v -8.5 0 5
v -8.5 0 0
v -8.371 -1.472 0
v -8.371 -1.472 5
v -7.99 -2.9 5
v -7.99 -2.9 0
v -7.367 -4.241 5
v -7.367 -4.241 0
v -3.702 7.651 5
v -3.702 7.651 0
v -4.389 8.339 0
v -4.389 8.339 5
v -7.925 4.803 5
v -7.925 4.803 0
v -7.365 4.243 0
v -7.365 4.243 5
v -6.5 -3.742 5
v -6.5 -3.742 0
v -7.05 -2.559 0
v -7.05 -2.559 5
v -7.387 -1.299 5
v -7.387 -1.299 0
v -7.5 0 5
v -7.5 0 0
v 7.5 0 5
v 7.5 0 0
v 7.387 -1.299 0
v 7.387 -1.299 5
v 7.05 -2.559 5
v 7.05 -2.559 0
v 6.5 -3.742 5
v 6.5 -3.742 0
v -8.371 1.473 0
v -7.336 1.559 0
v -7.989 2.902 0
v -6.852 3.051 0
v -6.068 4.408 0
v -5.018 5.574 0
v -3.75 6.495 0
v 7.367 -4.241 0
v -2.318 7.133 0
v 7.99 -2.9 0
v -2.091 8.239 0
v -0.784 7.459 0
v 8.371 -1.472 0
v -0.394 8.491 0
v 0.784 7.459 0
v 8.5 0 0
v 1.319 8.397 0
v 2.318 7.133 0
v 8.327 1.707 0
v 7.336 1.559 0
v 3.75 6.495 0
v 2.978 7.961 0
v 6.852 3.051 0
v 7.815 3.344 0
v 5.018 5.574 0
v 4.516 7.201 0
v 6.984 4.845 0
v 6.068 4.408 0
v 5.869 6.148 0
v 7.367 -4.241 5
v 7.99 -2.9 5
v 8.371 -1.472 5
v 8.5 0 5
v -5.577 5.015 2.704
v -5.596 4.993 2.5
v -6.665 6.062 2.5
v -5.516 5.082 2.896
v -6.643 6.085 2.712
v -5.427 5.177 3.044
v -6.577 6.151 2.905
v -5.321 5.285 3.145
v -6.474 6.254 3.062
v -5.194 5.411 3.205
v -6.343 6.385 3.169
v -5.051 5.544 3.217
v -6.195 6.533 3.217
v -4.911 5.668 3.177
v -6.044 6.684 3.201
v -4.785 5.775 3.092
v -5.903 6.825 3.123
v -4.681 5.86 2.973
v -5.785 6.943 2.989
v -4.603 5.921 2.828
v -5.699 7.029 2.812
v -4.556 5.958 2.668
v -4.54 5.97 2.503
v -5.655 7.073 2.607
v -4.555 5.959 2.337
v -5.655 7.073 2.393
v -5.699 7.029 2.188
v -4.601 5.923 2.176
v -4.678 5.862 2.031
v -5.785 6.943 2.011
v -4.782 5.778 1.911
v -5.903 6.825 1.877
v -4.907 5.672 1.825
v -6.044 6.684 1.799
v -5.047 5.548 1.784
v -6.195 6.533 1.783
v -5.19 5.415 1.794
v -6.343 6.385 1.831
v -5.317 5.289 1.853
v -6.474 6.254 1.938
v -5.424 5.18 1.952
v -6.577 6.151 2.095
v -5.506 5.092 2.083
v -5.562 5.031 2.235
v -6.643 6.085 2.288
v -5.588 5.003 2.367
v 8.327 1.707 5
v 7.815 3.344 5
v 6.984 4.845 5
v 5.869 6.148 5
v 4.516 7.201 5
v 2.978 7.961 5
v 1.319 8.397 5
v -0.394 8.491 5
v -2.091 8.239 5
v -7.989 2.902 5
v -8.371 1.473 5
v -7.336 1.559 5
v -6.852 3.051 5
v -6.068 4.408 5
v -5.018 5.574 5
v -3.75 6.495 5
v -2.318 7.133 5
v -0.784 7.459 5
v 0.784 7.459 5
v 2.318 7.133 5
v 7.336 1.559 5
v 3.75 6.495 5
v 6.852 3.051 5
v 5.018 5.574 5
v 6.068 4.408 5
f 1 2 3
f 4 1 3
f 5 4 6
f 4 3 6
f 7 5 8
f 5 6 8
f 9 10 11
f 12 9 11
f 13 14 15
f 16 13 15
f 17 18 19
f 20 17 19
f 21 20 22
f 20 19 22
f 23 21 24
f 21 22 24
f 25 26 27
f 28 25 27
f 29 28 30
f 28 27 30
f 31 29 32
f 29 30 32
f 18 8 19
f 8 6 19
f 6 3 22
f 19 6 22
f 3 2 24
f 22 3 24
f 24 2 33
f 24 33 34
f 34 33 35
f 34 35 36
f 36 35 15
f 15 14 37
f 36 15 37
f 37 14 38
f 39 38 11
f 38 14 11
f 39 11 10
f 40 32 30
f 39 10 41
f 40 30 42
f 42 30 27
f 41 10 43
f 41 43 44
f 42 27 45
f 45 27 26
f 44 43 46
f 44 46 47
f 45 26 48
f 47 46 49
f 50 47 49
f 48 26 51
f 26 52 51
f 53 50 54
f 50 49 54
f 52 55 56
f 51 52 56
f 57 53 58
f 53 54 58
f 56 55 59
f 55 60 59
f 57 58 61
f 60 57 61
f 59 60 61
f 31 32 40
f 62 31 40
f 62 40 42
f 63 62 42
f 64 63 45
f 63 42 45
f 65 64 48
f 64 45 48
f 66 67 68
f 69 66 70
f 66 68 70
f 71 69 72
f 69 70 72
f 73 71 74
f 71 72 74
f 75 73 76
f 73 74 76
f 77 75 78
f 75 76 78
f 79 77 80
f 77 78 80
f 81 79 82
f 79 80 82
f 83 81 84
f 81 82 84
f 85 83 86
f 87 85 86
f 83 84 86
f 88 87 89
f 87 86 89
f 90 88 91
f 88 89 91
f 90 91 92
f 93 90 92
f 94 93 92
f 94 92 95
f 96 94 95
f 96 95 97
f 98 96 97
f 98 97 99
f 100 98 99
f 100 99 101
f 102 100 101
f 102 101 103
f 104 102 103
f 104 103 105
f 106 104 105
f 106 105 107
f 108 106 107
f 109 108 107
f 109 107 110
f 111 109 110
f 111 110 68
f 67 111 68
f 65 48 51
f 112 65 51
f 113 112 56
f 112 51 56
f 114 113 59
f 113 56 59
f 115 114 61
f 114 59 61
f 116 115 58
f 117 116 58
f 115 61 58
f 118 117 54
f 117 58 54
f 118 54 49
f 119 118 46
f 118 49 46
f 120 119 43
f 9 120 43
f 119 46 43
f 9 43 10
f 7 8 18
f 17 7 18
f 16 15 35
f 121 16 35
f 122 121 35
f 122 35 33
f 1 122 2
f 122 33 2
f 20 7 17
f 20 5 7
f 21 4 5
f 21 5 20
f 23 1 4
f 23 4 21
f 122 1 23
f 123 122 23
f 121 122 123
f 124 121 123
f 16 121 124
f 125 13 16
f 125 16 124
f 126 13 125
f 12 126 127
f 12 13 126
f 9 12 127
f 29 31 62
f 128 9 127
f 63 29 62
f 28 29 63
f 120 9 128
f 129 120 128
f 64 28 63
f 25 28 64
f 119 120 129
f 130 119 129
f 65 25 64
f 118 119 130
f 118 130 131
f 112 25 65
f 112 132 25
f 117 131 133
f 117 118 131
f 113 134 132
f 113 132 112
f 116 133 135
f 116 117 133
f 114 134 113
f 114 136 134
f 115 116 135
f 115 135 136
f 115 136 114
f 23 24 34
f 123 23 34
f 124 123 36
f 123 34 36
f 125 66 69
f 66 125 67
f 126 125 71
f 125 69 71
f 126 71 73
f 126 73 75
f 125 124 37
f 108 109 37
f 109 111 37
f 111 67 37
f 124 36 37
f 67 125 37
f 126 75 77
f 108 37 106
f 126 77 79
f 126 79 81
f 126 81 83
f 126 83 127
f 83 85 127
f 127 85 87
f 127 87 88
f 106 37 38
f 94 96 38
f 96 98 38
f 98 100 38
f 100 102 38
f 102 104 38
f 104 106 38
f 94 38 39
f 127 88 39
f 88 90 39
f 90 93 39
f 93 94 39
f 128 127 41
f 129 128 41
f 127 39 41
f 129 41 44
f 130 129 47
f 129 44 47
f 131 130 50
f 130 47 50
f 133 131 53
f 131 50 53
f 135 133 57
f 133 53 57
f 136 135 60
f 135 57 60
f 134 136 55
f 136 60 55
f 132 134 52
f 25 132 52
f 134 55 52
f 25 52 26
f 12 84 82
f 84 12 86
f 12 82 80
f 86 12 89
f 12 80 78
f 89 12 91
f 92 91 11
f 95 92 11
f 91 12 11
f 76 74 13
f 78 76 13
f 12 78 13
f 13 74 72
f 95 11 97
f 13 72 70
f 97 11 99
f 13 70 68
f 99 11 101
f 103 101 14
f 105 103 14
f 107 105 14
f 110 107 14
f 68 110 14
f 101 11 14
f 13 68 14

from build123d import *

# Parameters (mm, degrees)
BOSS_EXTRUDE2_DEPTH = 5
BOSS_EXTRUDE3_DEPTH = 5
SKETCH3_R           = 0.71884788
CUT_EXTRUDE1_DEPTH  = 5


# Read off the part's stored shape, not the designer's step: Boss-Extrude3
with BuildPart() as part:
    # Sketch1 → Boss-Extrude2 (new body)
    with BuildSketch(Plane.XY):
        with BuildLine():
            Line((-7.366666667, -4.240545038), (-6.5, -3.741657387))
            ThreePointArc((-6.5, -3.741657387), (-7.245688373, -1.936491673), (-7.5, 0))
            ThreePointArc((-7.5, 0), (0, 7.5), (7.5, 0))
            ThreePointArc((7.5, 0), (7.245688373, -1.936491673), (6.5, -3.741657387))
            Line((6.5, -3.741657387), (7.366666667, -4.240545038))
            ThreePointArc((7.366666667, -4.240545038), (8.211780156, -2.194690563), (8.5, 0))
            ThreePointArc((8.5, 0), (0, 8.5), (-8.5, 0))
            ThreePointArc((-8.5, 0), (-8.211780156, -2.194690563), (-7.366666667, -4.240545038))
        make_face()
    extrude(amount=BOSS_EXTRUDE2_DEPTH)

    # Boss-Extrude3 outline → Boss-Extrude3 (add)
    with BuildSketch(Plane.XY):
        with BuildLine():
            Line((-7.924926196, 4.802995865), (-7.365135024, 4.243204694))
            ThreePointArc((-7.365135024, 4.243204694), (-5.790125857, 6.222896638), (-3.702233025, 7.651370506))
            Line((-3.702233025, 7.651370506), (-4.38939229, 8.338529771))
            Line((-4.38939229, 8.338529771), (-7.924926196, 4.802995865))
        make_face()
    extrude(amount=BOSS_EXTRUDE3_DEPTH)

    # Sketch3 → Cut-Extrude1 (cut)
    with BuildSketch(Plane(origin=(-6.363961031, 6.363961031, 0), x_dir=(0, 0, 1), z_dir=(-0.7071067811865476, 0.7071067811865476, 0))):
        with Locations(Location((2.5, 0.292461893, 0), (0, 0, 270))):
            Circle(SKETCH3_R)
    extrude(amount=-CUT_EXTRUDE1_DEPTH, mode=Mode.SUBTRACT)


solid = part.part
